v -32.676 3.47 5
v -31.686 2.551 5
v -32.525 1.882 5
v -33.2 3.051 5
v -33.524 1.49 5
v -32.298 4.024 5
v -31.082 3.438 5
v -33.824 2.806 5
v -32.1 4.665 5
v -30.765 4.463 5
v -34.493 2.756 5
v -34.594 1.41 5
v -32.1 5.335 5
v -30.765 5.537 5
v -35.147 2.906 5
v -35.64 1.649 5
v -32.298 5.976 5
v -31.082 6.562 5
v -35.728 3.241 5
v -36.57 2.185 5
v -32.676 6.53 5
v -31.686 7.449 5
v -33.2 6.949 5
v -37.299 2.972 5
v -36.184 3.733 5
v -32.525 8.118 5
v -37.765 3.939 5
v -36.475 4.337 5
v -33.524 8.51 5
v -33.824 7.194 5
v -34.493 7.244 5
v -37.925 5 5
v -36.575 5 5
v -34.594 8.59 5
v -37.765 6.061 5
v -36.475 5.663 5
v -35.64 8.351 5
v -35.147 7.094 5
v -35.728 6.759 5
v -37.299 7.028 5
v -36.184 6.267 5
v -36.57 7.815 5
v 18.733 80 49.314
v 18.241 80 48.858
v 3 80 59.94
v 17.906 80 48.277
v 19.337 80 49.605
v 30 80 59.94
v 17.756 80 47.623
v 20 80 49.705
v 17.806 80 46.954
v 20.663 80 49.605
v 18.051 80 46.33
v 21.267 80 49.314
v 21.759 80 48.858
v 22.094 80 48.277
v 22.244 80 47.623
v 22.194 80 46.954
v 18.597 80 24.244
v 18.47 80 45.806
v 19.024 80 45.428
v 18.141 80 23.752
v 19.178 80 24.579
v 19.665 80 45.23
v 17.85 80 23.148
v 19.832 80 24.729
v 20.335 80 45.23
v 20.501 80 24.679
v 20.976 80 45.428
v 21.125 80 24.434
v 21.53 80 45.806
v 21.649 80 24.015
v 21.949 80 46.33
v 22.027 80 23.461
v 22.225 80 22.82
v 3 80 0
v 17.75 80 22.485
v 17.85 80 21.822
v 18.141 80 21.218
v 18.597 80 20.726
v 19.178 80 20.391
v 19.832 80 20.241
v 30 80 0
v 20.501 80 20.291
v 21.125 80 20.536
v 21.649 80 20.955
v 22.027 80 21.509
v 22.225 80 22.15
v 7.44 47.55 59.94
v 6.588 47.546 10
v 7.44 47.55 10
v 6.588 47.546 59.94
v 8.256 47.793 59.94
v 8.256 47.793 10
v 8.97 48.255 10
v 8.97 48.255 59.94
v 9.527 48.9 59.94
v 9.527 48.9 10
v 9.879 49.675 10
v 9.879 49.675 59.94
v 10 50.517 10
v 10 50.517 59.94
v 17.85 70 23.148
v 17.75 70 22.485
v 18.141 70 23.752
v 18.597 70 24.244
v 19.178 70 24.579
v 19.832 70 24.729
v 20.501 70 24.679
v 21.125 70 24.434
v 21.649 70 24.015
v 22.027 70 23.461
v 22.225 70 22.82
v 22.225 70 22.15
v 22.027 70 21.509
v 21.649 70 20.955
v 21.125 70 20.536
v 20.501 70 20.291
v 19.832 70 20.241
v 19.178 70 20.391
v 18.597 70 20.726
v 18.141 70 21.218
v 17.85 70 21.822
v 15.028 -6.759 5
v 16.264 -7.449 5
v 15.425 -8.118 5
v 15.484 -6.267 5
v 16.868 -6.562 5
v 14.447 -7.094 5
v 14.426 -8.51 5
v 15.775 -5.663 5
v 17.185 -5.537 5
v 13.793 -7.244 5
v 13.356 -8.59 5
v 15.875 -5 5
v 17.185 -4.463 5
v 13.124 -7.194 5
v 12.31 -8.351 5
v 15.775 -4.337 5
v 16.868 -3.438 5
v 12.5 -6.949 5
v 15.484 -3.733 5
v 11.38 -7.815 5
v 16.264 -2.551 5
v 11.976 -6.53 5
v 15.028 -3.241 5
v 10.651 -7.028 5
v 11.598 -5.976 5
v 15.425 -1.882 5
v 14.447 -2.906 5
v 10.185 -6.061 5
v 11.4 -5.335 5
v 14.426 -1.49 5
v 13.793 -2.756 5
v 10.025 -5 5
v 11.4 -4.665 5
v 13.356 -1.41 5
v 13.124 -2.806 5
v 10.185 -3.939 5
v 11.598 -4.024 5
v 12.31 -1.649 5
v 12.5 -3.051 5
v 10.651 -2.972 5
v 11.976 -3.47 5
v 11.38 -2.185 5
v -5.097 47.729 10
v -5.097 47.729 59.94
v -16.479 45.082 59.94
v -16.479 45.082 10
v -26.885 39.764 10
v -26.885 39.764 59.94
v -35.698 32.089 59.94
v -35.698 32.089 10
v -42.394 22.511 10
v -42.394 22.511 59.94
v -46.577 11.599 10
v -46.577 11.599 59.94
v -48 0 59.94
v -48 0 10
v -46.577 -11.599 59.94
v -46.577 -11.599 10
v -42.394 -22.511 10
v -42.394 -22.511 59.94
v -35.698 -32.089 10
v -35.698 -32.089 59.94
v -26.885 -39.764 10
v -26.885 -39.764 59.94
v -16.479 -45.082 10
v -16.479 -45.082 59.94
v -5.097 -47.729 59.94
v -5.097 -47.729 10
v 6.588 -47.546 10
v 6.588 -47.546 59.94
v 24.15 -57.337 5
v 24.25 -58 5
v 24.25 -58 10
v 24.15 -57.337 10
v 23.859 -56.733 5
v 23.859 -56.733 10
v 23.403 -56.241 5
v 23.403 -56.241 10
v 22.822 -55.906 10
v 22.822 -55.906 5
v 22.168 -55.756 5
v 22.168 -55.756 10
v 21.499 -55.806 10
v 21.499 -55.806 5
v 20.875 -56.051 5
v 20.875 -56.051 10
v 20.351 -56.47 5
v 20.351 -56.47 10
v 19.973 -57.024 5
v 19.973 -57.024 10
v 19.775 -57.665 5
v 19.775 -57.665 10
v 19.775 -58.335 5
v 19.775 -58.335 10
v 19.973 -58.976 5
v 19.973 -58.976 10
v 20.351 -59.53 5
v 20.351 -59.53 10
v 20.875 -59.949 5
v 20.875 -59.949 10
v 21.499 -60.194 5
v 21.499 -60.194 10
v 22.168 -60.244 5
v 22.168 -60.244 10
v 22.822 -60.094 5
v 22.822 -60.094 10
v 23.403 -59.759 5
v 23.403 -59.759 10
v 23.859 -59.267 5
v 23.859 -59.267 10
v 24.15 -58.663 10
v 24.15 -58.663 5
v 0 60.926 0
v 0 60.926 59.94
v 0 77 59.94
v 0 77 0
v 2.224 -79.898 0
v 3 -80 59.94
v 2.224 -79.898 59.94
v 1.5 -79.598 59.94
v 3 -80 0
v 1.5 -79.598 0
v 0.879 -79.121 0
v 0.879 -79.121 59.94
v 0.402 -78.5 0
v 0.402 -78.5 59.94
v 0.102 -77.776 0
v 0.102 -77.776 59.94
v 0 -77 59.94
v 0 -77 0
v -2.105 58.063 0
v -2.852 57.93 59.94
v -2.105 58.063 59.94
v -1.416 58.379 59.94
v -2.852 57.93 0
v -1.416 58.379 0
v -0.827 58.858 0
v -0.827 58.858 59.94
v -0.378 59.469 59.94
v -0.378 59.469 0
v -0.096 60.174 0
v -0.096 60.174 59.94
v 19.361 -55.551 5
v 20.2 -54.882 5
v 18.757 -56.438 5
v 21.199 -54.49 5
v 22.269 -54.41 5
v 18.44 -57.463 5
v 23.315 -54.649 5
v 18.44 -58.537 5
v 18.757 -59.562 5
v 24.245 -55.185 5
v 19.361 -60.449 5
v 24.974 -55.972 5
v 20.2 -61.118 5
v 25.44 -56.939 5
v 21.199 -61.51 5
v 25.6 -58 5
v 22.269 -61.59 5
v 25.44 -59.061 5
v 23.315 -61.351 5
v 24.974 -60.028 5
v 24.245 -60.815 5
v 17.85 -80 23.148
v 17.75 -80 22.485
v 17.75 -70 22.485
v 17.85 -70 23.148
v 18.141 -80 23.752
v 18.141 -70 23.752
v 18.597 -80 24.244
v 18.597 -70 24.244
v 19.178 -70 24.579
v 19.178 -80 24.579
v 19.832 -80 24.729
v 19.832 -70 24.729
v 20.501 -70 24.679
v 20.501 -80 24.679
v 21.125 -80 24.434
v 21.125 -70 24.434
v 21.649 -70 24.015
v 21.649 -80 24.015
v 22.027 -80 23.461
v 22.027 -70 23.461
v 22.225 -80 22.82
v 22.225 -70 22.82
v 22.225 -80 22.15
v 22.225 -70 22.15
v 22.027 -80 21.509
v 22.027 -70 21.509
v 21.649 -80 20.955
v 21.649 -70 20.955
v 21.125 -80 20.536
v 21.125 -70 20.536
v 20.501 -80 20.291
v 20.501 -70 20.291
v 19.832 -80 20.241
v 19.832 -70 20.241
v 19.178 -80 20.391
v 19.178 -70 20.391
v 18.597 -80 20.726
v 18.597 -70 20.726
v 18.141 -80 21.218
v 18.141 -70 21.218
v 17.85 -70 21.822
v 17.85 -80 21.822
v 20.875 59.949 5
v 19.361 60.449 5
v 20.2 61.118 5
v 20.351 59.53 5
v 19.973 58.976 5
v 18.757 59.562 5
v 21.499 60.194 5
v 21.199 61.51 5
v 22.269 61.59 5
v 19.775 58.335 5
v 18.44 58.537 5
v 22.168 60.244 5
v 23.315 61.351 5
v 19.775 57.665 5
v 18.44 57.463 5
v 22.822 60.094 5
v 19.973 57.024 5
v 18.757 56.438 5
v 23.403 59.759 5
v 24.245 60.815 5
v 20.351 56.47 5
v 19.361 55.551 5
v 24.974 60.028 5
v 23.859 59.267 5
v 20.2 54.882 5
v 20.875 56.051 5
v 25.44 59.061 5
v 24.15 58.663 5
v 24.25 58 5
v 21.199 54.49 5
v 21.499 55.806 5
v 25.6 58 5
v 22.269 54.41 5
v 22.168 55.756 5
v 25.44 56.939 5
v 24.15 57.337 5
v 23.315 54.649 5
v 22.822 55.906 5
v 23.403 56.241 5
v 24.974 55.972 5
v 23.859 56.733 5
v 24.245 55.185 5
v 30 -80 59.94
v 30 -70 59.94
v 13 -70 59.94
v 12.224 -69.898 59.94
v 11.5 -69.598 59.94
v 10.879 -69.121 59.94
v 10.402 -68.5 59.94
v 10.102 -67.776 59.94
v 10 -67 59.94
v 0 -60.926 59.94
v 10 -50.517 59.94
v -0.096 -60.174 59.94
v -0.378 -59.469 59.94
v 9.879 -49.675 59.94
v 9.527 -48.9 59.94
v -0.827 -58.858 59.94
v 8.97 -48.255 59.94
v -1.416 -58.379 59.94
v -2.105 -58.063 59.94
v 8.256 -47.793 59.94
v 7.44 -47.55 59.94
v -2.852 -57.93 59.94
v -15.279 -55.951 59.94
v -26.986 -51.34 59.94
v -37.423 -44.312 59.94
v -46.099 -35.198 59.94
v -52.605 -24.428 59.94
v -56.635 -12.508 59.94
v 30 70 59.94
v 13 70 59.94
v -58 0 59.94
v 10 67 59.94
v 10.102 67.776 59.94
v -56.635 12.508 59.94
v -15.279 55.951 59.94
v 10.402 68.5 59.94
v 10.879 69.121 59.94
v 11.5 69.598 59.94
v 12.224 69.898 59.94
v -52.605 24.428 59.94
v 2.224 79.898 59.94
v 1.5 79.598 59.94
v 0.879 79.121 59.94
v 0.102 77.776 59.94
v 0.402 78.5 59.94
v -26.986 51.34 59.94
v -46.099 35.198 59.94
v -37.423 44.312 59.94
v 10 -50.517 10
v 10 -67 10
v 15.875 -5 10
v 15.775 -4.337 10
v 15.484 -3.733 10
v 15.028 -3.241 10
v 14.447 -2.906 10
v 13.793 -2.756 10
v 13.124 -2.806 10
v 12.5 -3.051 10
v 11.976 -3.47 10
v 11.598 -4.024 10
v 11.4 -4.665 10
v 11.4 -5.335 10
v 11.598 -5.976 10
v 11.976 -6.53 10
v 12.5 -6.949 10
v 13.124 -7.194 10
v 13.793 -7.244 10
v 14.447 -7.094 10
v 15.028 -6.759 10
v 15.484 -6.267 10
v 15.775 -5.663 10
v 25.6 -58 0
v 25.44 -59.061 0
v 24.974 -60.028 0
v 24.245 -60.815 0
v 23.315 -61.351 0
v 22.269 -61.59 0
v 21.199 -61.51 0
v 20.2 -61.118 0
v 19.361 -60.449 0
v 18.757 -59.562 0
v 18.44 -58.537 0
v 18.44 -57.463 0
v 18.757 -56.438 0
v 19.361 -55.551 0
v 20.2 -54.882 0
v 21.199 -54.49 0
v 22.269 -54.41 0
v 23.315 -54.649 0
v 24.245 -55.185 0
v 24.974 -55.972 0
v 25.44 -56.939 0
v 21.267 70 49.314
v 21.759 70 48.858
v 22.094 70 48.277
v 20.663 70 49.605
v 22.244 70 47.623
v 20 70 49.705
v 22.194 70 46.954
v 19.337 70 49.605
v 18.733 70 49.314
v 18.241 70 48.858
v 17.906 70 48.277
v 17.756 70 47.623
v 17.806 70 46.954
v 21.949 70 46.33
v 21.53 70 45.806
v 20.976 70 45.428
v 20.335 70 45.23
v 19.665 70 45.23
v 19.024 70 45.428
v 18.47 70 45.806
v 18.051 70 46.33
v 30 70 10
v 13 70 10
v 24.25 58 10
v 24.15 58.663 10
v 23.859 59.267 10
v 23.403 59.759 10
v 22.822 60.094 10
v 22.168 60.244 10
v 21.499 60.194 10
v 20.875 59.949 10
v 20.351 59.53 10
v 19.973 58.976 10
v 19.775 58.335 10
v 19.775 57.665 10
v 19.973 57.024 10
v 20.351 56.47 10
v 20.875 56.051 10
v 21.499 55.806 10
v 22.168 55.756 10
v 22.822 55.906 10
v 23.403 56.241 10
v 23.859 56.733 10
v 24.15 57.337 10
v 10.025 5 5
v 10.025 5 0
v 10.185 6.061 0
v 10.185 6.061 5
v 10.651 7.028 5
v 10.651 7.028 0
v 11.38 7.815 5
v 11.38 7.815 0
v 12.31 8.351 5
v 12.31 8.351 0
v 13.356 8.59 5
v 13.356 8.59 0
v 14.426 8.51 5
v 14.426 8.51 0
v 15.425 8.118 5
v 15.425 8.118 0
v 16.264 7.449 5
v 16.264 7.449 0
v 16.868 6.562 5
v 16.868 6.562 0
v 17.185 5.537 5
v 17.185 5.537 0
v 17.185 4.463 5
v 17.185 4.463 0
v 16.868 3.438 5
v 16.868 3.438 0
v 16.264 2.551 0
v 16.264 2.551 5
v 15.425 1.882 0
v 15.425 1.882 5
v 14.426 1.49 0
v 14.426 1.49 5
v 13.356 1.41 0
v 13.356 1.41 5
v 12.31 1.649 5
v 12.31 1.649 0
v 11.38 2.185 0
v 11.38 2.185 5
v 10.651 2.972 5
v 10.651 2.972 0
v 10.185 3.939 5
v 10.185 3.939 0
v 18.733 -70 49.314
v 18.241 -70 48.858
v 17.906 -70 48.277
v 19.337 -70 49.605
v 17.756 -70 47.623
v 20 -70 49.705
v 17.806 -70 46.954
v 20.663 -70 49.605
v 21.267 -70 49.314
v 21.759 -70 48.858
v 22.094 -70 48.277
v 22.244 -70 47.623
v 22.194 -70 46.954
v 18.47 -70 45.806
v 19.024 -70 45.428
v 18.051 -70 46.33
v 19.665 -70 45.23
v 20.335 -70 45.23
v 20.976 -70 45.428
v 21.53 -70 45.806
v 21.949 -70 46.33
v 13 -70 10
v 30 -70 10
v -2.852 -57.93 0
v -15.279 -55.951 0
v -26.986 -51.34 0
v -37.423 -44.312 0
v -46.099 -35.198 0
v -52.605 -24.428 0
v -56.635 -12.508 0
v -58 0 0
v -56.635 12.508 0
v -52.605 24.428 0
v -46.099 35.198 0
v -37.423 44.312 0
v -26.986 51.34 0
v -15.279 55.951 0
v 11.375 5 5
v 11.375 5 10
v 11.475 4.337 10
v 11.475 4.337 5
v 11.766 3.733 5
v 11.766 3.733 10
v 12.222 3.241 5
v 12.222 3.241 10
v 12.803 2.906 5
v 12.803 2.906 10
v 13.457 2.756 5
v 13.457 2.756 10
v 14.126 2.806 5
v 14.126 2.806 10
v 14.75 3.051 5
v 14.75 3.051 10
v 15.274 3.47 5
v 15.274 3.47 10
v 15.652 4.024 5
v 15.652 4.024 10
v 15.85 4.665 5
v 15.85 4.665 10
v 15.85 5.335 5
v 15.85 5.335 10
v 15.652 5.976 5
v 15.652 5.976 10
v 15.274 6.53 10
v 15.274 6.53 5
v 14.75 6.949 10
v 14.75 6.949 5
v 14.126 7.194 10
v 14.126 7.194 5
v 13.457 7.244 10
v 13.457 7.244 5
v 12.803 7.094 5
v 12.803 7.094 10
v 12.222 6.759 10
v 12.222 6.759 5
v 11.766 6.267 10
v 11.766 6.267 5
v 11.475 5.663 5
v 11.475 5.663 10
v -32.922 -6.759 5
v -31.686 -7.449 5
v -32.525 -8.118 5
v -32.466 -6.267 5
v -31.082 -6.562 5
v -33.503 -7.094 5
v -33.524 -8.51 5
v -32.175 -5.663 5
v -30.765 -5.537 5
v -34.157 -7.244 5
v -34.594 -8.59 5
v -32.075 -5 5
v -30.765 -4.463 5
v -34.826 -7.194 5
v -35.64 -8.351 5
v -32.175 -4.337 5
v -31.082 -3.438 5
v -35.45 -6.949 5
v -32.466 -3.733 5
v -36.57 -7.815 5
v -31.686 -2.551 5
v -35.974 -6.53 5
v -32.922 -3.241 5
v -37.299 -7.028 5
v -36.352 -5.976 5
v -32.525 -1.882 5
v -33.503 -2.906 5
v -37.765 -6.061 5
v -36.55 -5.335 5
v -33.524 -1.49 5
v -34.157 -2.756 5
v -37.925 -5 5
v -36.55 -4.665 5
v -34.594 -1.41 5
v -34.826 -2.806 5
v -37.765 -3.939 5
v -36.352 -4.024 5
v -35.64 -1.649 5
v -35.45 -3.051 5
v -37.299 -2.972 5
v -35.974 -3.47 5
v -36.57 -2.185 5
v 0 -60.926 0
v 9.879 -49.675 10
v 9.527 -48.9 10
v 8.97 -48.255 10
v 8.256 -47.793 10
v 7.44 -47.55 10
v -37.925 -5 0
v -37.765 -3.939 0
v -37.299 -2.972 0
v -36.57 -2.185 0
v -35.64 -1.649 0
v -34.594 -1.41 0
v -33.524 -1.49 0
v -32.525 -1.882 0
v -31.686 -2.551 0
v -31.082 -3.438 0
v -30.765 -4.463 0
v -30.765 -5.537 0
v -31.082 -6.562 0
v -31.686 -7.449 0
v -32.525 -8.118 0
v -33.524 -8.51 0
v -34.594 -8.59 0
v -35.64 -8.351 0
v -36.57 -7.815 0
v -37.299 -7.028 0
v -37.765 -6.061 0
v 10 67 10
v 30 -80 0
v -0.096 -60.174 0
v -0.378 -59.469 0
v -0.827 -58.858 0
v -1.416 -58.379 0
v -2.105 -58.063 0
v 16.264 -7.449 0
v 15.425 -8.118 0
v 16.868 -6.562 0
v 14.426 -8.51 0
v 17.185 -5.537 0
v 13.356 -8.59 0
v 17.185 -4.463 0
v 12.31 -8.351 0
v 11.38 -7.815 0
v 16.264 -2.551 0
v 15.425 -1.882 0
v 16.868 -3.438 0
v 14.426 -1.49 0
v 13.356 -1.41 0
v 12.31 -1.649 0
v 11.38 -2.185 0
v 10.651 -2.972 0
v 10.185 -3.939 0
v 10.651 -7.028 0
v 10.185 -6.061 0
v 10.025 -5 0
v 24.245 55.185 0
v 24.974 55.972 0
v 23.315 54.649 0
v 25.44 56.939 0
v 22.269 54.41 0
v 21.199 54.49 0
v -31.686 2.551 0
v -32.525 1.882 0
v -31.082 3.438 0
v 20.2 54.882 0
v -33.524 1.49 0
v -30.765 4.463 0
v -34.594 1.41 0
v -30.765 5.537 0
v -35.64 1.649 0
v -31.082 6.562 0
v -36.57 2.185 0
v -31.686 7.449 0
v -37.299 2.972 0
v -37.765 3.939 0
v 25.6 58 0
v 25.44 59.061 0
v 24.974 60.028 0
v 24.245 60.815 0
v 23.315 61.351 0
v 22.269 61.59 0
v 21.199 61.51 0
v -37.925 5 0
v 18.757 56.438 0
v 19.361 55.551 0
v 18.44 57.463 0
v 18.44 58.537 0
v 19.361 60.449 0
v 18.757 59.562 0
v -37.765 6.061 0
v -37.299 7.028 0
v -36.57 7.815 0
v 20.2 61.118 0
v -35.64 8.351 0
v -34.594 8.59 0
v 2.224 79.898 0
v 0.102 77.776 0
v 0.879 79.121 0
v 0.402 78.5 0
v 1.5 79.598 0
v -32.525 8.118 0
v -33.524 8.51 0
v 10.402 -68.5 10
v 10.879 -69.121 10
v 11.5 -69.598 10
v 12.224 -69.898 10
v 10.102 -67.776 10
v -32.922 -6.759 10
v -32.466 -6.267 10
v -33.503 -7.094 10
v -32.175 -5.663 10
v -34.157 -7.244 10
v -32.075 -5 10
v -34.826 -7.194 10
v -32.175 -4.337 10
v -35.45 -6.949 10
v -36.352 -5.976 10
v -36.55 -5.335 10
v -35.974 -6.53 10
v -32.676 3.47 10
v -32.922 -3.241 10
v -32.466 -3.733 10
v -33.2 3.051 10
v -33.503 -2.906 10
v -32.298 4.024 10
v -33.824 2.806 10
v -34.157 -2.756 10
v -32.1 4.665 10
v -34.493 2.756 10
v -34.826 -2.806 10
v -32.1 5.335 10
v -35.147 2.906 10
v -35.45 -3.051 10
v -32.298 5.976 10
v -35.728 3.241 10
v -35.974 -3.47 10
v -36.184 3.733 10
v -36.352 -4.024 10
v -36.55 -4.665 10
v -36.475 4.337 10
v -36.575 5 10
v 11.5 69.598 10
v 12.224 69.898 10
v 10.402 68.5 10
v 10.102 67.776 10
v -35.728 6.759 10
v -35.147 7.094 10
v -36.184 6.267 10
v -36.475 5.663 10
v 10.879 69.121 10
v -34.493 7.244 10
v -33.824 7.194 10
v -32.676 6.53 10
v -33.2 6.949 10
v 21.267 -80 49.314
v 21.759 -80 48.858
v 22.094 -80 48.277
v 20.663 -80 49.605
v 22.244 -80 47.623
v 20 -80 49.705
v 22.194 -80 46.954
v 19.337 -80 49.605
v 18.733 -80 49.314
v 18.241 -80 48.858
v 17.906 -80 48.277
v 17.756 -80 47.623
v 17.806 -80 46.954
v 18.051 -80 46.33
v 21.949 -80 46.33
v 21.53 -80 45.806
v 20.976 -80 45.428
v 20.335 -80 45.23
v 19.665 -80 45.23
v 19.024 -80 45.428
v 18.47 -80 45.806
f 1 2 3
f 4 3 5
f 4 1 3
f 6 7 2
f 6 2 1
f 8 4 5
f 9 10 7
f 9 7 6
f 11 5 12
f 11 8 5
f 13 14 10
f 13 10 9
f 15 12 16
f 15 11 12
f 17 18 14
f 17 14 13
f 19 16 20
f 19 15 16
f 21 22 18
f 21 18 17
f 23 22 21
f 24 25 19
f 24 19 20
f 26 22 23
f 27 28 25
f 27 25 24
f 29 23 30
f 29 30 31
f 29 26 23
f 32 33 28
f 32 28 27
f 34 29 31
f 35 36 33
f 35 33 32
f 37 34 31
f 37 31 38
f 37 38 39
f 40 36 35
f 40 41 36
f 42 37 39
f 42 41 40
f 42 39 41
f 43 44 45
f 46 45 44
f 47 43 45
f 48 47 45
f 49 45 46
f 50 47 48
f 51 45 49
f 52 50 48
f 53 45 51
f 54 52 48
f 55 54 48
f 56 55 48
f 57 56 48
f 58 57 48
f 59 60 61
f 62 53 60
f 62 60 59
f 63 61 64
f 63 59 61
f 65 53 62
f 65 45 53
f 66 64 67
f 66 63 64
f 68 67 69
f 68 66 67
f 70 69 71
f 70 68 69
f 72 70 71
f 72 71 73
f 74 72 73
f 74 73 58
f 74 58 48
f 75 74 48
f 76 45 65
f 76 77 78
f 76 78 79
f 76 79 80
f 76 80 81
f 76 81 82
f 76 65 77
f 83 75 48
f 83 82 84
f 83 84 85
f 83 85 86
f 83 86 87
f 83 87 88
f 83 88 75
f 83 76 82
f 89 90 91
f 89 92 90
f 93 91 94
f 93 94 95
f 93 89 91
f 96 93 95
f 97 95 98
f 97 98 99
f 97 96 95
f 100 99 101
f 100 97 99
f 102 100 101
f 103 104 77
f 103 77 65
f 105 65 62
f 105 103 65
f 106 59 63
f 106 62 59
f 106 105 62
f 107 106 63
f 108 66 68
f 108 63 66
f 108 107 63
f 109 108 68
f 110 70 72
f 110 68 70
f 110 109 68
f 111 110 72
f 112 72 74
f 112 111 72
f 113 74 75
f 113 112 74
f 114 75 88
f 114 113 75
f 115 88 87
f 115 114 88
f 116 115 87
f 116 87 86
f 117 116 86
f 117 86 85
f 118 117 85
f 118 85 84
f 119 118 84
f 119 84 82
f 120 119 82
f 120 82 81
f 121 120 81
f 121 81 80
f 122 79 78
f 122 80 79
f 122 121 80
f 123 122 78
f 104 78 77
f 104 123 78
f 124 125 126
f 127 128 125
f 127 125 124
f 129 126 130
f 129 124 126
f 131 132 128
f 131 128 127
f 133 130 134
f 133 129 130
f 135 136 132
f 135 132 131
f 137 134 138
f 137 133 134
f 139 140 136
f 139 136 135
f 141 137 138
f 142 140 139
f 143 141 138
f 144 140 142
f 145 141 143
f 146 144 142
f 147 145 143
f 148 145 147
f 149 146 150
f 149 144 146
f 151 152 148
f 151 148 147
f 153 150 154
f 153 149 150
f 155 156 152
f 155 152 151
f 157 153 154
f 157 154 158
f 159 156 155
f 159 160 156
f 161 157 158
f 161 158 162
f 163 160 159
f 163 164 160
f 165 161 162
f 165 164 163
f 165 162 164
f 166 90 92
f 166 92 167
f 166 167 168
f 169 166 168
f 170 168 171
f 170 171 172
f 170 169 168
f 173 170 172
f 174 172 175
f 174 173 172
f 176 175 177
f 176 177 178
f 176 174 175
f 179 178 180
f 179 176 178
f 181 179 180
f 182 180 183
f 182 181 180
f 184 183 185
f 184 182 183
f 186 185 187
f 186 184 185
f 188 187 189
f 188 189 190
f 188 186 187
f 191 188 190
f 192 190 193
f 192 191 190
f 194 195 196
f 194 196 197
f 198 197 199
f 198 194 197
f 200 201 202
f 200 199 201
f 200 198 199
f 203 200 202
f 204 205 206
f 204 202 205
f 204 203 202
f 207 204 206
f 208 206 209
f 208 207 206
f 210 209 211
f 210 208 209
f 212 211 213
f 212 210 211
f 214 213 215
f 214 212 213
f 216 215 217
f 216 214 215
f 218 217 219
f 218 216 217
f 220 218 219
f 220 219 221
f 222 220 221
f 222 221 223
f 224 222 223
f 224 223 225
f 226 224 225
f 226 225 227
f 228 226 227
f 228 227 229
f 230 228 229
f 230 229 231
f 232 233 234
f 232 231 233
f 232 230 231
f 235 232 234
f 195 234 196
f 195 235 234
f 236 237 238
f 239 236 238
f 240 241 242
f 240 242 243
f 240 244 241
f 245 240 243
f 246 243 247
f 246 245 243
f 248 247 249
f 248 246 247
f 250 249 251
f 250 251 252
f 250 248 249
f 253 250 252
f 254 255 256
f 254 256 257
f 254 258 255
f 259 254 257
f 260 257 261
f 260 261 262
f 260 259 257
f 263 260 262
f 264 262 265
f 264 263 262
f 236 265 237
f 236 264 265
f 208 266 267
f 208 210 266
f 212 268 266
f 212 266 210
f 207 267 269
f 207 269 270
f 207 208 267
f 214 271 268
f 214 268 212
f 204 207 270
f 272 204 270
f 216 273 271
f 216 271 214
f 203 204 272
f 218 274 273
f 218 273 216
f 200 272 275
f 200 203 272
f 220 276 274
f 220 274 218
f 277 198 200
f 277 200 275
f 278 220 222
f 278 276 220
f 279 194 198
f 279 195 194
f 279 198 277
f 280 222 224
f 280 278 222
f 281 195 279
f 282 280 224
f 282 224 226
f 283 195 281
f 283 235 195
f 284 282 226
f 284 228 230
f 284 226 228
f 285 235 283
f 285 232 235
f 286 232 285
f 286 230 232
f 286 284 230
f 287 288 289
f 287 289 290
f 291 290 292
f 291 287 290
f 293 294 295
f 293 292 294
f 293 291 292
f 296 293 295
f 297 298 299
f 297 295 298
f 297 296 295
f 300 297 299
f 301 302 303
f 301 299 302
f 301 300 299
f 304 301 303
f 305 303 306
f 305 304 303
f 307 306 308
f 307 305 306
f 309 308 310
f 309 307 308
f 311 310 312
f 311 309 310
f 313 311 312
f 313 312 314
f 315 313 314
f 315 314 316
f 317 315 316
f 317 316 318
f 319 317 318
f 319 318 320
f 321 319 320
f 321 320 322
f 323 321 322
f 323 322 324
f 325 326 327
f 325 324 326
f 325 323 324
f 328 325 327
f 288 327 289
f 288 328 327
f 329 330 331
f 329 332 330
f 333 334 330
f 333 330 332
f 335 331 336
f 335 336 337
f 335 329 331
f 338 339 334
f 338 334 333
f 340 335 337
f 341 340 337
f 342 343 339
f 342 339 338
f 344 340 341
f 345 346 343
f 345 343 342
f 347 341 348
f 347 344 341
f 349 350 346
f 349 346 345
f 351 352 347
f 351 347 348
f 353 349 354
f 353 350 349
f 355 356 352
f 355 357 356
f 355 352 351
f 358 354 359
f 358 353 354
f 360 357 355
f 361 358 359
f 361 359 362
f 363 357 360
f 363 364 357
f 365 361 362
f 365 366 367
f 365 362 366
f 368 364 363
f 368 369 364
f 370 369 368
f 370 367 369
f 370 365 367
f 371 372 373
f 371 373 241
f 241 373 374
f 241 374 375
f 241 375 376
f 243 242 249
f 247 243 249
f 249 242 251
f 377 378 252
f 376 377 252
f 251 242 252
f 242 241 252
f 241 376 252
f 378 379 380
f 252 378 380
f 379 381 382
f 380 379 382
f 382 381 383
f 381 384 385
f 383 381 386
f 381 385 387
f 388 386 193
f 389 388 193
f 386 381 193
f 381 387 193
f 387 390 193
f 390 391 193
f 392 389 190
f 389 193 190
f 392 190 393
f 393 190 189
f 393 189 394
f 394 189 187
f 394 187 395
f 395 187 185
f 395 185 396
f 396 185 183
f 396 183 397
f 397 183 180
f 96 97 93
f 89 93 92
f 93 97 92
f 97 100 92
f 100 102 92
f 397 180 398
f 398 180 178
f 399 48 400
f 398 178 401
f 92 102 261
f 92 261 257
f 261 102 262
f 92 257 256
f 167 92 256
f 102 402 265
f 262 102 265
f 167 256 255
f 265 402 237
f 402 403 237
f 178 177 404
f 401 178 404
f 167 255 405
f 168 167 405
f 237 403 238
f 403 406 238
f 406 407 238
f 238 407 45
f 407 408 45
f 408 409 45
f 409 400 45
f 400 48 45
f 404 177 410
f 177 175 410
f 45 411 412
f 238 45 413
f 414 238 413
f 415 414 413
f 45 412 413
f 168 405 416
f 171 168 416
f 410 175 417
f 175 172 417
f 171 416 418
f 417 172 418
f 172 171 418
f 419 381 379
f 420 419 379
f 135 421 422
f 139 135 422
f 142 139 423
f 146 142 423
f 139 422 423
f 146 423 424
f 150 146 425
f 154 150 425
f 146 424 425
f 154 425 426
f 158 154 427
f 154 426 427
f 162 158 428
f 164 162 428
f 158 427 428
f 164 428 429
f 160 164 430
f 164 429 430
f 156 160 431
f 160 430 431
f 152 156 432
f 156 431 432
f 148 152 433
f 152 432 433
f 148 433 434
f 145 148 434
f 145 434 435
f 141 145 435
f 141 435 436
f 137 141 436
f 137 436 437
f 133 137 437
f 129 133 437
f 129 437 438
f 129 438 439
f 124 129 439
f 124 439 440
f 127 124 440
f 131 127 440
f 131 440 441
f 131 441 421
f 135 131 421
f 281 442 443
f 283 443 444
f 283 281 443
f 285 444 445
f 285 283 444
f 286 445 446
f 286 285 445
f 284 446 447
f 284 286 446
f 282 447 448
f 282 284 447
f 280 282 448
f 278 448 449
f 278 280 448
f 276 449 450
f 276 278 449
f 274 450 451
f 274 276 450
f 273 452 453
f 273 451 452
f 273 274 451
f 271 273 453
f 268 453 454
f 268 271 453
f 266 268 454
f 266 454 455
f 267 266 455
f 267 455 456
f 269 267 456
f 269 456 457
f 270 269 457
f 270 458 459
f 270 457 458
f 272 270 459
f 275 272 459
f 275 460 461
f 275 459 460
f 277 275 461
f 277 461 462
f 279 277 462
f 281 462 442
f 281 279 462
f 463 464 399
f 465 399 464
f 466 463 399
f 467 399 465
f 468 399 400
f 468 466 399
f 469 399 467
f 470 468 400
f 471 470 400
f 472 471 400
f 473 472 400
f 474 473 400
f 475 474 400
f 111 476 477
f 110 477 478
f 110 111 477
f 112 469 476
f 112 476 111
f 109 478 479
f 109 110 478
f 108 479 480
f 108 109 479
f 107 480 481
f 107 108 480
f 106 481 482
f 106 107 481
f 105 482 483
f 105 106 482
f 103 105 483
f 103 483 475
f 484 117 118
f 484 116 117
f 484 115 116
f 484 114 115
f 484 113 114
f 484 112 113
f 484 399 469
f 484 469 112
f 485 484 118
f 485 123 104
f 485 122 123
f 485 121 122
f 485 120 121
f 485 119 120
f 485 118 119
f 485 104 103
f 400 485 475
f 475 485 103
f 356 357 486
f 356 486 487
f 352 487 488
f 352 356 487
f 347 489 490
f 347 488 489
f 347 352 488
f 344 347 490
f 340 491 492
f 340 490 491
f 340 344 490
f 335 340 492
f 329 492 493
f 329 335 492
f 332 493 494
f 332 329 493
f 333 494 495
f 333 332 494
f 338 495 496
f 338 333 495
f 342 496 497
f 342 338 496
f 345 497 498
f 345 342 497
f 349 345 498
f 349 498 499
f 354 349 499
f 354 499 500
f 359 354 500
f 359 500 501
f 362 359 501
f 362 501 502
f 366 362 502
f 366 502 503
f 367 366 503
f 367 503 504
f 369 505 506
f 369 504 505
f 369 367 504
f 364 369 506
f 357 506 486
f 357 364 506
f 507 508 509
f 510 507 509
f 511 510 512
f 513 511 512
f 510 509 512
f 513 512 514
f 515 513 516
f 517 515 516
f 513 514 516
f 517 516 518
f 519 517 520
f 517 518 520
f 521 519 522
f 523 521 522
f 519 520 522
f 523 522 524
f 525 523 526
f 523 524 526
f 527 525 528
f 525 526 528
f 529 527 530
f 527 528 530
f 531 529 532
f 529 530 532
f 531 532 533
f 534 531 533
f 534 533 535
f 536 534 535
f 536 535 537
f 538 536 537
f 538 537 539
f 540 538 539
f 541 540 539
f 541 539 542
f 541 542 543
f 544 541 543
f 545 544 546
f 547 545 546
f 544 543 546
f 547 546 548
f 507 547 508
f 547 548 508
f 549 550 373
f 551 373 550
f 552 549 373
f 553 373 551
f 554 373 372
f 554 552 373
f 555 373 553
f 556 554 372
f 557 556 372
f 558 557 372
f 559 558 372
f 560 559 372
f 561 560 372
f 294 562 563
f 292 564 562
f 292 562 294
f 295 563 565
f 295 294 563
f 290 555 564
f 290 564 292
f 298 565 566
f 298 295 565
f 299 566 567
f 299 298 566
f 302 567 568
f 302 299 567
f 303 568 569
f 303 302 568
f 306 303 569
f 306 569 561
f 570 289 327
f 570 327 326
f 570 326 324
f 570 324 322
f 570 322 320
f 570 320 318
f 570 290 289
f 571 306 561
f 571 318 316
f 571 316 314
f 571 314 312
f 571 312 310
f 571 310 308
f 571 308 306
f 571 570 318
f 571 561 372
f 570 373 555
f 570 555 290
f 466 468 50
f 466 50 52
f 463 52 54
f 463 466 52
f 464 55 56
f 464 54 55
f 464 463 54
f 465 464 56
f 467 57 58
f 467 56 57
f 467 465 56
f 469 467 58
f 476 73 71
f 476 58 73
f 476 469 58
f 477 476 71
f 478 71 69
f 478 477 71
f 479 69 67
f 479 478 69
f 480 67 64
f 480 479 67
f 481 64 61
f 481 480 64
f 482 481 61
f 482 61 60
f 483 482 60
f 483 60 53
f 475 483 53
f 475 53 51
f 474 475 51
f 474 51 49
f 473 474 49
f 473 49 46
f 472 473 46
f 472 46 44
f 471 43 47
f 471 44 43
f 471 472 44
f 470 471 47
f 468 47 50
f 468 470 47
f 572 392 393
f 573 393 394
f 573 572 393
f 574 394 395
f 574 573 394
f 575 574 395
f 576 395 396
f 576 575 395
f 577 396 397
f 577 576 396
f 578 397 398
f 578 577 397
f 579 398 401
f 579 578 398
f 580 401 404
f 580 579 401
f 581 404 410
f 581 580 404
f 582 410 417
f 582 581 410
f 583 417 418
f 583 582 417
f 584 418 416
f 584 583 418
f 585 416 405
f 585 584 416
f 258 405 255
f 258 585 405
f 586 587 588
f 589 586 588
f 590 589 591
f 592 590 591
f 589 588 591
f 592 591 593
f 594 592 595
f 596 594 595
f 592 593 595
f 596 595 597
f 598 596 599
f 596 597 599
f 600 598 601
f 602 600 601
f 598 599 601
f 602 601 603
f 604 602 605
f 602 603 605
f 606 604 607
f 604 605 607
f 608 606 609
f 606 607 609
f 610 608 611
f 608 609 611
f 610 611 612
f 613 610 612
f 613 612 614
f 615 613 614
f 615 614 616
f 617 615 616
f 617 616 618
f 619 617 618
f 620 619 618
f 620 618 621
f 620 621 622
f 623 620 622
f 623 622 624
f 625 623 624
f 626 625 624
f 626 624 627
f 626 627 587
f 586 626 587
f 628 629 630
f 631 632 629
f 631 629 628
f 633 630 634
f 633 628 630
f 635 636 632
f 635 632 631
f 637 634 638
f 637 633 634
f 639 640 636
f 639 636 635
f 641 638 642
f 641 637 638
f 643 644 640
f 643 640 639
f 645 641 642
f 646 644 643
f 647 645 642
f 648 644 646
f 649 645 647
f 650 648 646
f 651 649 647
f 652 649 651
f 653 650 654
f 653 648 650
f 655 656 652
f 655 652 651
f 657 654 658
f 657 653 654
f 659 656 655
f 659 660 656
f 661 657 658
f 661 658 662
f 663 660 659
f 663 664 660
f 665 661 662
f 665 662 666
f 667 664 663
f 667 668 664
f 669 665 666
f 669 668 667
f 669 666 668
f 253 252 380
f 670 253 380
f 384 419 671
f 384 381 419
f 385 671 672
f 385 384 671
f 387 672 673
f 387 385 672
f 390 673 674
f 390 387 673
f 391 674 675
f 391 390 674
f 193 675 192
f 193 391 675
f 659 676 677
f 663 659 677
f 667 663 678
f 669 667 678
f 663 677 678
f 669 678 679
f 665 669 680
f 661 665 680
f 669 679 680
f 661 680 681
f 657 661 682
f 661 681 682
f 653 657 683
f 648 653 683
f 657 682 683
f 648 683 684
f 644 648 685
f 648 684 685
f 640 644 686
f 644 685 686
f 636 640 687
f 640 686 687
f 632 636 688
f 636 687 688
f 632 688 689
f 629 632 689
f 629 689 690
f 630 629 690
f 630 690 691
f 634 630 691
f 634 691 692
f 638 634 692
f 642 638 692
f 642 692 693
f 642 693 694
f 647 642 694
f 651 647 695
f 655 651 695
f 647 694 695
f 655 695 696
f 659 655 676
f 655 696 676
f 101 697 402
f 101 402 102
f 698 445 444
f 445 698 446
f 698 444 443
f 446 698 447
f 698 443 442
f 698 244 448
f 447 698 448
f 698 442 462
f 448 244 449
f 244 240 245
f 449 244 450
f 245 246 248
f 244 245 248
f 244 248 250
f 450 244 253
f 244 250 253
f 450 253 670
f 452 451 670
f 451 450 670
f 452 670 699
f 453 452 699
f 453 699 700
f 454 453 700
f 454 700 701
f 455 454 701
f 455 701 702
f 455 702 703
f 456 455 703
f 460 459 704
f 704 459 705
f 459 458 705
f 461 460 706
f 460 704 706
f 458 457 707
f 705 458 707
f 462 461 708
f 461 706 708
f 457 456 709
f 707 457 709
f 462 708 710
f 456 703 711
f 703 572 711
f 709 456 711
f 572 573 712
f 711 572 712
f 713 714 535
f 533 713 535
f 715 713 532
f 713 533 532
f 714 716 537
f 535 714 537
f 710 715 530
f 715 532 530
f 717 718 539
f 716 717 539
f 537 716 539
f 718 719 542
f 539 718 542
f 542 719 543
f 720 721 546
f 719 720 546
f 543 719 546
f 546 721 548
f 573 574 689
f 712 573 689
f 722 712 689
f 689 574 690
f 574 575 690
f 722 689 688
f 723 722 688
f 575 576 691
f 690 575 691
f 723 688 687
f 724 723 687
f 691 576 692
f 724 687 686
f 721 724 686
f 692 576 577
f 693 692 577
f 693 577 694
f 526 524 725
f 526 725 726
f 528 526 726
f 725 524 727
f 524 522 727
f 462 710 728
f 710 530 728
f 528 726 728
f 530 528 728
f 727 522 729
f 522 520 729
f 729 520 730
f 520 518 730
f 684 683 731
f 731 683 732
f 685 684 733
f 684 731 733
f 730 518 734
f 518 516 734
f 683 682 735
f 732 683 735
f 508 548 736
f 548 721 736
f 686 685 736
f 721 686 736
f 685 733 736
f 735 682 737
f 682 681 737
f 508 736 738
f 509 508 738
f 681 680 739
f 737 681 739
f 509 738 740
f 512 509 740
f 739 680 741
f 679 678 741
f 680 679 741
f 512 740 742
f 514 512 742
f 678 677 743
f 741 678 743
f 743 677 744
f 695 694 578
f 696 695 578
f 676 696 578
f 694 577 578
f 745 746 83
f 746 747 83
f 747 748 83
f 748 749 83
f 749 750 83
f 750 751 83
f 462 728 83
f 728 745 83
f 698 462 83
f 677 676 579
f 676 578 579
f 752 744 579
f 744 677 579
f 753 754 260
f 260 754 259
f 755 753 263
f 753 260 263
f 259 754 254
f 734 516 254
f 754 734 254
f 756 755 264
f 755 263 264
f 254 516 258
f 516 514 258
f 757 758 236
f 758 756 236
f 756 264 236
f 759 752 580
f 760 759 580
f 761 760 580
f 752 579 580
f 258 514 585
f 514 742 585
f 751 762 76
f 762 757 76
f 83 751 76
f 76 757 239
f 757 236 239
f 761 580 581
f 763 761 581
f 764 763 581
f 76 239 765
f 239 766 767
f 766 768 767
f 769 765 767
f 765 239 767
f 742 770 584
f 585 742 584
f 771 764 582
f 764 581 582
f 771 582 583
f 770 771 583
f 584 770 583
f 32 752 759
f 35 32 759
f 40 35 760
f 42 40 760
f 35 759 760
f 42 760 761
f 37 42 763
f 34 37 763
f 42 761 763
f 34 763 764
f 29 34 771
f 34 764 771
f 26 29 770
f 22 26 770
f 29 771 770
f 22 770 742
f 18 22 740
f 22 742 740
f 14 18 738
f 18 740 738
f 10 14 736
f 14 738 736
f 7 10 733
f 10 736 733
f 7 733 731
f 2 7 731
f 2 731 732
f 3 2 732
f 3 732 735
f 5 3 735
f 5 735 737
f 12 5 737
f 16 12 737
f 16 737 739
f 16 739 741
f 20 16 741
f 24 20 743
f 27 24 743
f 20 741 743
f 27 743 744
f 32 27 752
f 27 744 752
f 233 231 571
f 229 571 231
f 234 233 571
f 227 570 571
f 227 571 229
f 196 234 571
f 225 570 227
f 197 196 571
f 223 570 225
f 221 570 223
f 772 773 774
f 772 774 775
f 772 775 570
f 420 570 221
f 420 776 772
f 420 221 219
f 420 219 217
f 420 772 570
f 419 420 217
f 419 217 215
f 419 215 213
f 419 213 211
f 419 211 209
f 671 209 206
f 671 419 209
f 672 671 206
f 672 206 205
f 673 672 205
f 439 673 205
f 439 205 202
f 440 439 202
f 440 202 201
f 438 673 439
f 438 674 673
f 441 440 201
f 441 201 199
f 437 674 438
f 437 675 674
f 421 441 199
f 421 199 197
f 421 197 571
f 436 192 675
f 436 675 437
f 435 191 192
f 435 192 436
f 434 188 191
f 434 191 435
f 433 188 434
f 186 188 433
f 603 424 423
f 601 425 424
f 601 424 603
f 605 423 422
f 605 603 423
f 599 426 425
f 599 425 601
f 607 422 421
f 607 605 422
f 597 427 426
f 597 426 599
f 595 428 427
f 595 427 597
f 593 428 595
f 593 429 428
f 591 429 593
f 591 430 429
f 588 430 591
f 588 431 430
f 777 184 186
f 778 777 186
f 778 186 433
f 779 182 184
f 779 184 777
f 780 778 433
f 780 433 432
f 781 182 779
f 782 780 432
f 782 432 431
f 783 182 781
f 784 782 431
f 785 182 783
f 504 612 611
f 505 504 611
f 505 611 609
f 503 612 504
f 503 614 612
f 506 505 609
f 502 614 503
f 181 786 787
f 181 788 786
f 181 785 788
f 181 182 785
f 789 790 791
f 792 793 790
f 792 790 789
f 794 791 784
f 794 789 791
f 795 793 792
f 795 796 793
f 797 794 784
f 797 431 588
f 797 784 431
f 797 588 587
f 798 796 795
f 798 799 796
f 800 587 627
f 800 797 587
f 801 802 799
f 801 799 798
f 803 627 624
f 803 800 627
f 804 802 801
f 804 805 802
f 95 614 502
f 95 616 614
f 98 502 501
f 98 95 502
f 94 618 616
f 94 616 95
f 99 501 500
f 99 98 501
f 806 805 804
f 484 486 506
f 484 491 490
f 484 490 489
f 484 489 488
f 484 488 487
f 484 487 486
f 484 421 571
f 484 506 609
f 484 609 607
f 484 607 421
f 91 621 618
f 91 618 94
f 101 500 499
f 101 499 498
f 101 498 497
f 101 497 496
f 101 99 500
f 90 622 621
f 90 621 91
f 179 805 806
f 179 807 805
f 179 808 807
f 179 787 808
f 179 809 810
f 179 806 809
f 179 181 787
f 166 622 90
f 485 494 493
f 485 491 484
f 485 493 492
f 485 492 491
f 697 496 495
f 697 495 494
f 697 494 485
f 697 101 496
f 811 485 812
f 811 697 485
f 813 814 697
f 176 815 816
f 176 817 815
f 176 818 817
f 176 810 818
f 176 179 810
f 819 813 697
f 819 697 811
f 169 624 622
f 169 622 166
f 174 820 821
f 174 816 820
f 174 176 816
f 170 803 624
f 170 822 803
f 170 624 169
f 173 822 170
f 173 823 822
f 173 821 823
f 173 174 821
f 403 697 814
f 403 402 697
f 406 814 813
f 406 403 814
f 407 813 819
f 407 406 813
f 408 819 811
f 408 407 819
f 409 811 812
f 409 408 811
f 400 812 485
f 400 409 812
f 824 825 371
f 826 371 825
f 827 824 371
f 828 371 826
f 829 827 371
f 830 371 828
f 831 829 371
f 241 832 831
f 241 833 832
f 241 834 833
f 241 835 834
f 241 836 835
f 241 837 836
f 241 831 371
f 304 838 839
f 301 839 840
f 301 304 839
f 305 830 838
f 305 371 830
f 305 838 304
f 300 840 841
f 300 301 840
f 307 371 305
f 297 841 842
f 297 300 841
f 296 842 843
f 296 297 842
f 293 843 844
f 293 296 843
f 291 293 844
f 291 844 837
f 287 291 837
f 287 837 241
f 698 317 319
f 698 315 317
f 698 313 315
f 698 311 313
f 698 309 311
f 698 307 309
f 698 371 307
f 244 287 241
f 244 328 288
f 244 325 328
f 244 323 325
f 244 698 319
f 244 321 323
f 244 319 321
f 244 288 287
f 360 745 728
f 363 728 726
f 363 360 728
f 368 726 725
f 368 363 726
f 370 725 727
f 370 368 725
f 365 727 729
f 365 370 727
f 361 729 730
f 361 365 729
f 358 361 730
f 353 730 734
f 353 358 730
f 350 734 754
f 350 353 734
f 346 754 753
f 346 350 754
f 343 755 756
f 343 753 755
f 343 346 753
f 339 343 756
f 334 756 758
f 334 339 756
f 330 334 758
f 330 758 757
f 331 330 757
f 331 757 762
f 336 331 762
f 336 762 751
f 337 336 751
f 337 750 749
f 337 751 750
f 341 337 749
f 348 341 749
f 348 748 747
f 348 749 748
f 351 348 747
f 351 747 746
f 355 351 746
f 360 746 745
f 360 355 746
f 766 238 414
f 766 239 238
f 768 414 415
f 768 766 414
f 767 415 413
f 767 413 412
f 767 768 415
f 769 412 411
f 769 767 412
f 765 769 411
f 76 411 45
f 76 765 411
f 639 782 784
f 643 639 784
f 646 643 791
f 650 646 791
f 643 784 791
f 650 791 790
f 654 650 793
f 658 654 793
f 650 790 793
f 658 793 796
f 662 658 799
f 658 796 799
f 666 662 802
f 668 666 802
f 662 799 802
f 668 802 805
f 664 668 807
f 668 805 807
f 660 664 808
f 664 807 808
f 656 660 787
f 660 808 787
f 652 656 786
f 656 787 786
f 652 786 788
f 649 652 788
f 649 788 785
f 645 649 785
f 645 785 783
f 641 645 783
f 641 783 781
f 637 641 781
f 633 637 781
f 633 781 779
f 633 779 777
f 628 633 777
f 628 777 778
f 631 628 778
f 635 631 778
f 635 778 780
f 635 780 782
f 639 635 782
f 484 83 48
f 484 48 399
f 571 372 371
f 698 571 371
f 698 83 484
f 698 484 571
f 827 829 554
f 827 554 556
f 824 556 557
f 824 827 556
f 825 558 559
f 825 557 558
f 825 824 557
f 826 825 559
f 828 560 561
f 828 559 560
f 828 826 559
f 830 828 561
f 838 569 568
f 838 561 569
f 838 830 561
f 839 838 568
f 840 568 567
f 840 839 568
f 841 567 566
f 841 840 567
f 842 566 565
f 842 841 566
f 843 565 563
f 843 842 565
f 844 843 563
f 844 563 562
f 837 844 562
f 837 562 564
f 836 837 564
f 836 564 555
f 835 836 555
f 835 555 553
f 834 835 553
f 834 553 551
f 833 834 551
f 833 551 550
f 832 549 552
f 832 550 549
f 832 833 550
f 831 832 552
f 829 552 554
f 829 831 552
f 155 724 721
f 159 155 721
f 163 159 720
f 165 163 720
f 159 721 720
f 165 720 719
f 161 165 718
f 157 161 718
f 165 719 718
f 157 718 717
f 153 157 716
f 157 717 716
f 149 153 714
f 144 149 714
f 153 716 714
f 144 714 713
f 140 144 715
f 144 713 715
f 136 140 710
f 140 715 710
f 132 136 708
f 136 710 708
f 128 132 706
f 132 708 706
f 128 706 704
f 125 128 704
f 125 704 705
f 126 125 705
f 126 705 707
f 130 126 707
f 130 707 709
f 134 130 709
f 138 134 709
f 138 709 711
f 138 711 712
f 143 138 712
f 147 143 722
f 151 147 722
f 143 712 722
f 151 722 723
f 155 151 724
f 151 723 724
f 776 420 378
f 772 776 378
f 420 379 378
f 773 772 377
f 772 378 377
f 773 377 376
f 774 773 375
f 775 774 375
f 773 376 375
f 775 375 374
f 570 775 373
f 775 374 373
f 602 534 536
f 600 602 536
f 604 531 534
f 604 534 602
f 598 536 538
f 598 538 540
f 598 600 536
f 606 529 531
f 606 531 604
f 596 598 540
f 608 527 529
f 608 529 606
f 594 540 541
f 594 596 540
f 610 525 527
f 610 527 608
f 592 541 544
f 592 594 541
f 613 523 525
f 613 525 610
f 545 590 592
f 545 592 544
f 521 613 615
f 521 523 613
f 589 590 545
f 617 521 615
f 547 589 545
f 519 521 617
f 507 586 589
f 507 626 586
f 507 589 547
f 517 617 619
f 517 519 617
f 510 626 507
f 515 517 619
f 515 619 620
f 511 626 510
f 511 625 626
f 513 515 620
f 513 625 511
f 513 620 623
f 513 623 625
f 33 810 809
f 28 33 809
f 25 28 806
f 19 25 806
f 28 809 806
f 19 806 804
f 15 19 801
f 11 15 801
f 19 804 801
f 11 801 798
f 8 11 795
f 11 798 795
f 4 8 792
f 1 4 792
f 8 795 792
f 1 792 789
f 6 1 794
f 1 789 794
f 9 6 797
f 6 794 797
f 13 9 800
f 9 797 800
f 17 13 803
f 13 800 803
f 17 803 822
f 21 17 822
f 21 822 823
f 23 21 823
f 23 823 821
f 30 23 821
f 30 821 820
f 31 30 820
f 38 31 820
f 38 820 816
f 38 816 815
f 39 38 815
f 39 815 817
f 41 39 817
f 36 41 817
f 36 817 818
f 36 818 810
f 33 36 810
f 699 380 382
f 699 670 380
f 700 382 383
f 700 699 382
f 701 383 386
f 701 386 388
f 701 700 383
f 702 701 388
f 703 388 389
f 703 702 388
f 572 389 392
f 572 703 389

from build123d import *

# Parameters (mm, degrees)
BOSS_EXTRUDE2_DEPTH     = 10
SKETCH3_R               = 2.25
CUT_EXTRUDE2_DEPTH      = 100.317672143
SKETCH4_R               = 3.6
CUT_EXTRUDE3_DEPTH      = 5
BOSS_EXTRUDE4_DEPTH     = 49.94
CUT_EXTRUDE5_DEPTH      = 172.629844724
CUT_EXTRUDE5_DEPTH_BACK = 172.629844724
SKETCH7_R               = 2.25
CUT_EXTRUDE6_DEPTH      = 111.715868781
CUT_EXTRUDE6_DEPTH_BACK = 111.715868781
SKETCH8_R               = 2.25
FILLET1_R               = 3
CUT_EXTRUDE7_DEPTH      = 116.571638389
CUT_EXTRUDE7_DEPTH_BACK = 5
SKETCH9_R               = 3.6


with BuildPart() as part:
    # Sketch1 → Boss-Extrude2 (new body)
    with BuildSketch(Plane(origin=(0, 0, 0), x_dir=(0, 1, 0), z_dir=(0, 0, 1))):
        with BuildLine():
            Line((-58, 0), (-80, 0))
            Line((-80, 0), (-80, -30))
            Line((-80, -30), (80, -30))
            Line((80, -30), (80, 0))
            Line((80, 0), (58, 0))
            ThreePointArc((58, 0), (0, 58), (-58, 0))
        make_face()
    extrude(amount=BOSS_EXTRUDE2_DEPTH)

    # Sketch3 → Cut-Extrude2 (cut, through all)
    with BuildSketch(Plane.XY.offset(10)):
        with Locations((13.625, -5)):
            Circle(SKETCH3_R)
        with Locations((-34.325, -5)):
            Circle(SKETCH3_R)
        with Locations(Location((-34.325, 5, 0), (0, 0, 180))):
            Circle(SKETCH3_R)
        with Locations(Location((13.625, 5, 0), (0, 0, 180))):
            Circle(SKETCH3_R)
    extrude(amount=-CUT_EXTRUDE2_DEPTH, mode=Mode.SUBTRACT)

    # Sketch4 → Cut-Extrude3 (cut)
    with BuildSketch(Plane(origin=(0, 0, 0), x_dir=(1, 0, 0), z_dir=(0, 0, -1))):
        with Locations(Location((-34.325, -5, 0), (0, 0, 180))):
            Circle(SKETCH4_R)
        with Locations(Location((-34.325, 5, 0), (0, 0, 180))):
            Circle(SKETCH4_R)
        with Locations(Location((13.625, 5, 0), (0, 0, 180))):
            Circle(SKETCH4_R)
        with Locations(Location((13.625, -5, 0), (0, 0, 180))):
            Circle(SKETCH4_R)
    extrude(amount=-CUT_EXTRUDE3_DEPTH, mode=Mode.SUBTRACT)

    # Sketch5 → Boss-Extrude4 (add)
    with BuildSketch(Plane.XY.offset(10)):
        with BuildLine():
            Line((10, -46.946778377), (10, -70))
            Line((10, -70), (20, -70))
            Line((20, -70), (30, -70))
            Line((30, -70), (30, -80))
            Line((30, -80), (0, -80))
            Line((0, -80), (0, -58))
            ThreePointArc((0, -58), (-58, 0), (0, 58))
            Line((0, 58), (0, 80))
            Line((0, 80), (30, 80))
            Line((30, 80), (30, 70))
            Line((30, 70), (20, 70))
            Line((20, 70), (10, 70))
            Line((10, 70), (10, 46.946778377))
            ThreePointArc((10, 46.946778377), (-48, 0), (10, -46.946778377))
        make_face()
    extrude(amount=BOSS_EXTRUDE4_DEPTH)

    # Sketch7 → Cut-Extrude5 (cut, two sides: drawn at the far end of the back side and taken through both)
    with BuildSketch(Plane(origin=(0, -70, 0), x_dir=(-1, 0, 0), z_dir=(0, 1, 0)).offset(-CUT_EXTRUDE5_DEPTH_BACK)):
        with Locations(Location((-20, 47.455, 0), (0, 0, 90))):
            Circle(SKETCH7_R)
        with Locations((-20, 22.485)):
            Circle(SKETCH7_R)
    extrude(amount=CUT_EXTRUDE5_DEPTH + CUT_EXTRUDE5_DEPTH_BACK, mode=Mode.SUBTRACT)

    # Sketch8 → Cut-Extrude6 (cut, two sides: drawn at the far end of the back side and taken through both)
    with BuildSketch(Plane.XY.offset(10).offset(-CUT_EXTRUDE6_DEPTH_BACK)):
        with Locations((22, -58)):
            Circle(SKETCH8_R)
        with Locations((22, 58)):
            Circle(SKETCH8_R)
    extrude(amount=CUT_EXTRUDE6_DEPTH + CUT_EXTRUDE6_DEPTH_BACK, mode=Mode.SUBTRACT)

    # Fillet1
    fillet1_edges = [part.edges().sort_by_distance(p)[0] for p in [
        (0, 80, 29.97),
        (0, -80, 29.97),
        (0, -58, 29.97),
        (0, 58, 29.97),
        (10, -70, 34.97),
        (10, -46.946778377, 34.97),
        (10, 46.946778377, 34.97),
        (10, 70, 34.97),
    ]]
    fillet(fillet1_edges, radius=FILLET1_R)

    # Sketch9 → Cut-Extrude7 (cut, two sides: drawn at the far end of the back side and taken through both)
    with BuildSketch(Plane(origin=(0, 0, 0), x_dir=(1, 0, 0), z_dir=(0, 0, -1)).offset(-CUT_EXTRUDE7_DEPTH_BACK)):
        with Locations((22, 58)):
            Circle(SKETCH9_R)
        with Locations((22, -58)):
            Circle(SKETCH9_R)
    extrude(amount=CUT_EXTRUDE7_DEPTH + CUT_EXTRUDE7_DEPTH_BACK, mode=Mode.SUBTRACT)


solid = part.part
